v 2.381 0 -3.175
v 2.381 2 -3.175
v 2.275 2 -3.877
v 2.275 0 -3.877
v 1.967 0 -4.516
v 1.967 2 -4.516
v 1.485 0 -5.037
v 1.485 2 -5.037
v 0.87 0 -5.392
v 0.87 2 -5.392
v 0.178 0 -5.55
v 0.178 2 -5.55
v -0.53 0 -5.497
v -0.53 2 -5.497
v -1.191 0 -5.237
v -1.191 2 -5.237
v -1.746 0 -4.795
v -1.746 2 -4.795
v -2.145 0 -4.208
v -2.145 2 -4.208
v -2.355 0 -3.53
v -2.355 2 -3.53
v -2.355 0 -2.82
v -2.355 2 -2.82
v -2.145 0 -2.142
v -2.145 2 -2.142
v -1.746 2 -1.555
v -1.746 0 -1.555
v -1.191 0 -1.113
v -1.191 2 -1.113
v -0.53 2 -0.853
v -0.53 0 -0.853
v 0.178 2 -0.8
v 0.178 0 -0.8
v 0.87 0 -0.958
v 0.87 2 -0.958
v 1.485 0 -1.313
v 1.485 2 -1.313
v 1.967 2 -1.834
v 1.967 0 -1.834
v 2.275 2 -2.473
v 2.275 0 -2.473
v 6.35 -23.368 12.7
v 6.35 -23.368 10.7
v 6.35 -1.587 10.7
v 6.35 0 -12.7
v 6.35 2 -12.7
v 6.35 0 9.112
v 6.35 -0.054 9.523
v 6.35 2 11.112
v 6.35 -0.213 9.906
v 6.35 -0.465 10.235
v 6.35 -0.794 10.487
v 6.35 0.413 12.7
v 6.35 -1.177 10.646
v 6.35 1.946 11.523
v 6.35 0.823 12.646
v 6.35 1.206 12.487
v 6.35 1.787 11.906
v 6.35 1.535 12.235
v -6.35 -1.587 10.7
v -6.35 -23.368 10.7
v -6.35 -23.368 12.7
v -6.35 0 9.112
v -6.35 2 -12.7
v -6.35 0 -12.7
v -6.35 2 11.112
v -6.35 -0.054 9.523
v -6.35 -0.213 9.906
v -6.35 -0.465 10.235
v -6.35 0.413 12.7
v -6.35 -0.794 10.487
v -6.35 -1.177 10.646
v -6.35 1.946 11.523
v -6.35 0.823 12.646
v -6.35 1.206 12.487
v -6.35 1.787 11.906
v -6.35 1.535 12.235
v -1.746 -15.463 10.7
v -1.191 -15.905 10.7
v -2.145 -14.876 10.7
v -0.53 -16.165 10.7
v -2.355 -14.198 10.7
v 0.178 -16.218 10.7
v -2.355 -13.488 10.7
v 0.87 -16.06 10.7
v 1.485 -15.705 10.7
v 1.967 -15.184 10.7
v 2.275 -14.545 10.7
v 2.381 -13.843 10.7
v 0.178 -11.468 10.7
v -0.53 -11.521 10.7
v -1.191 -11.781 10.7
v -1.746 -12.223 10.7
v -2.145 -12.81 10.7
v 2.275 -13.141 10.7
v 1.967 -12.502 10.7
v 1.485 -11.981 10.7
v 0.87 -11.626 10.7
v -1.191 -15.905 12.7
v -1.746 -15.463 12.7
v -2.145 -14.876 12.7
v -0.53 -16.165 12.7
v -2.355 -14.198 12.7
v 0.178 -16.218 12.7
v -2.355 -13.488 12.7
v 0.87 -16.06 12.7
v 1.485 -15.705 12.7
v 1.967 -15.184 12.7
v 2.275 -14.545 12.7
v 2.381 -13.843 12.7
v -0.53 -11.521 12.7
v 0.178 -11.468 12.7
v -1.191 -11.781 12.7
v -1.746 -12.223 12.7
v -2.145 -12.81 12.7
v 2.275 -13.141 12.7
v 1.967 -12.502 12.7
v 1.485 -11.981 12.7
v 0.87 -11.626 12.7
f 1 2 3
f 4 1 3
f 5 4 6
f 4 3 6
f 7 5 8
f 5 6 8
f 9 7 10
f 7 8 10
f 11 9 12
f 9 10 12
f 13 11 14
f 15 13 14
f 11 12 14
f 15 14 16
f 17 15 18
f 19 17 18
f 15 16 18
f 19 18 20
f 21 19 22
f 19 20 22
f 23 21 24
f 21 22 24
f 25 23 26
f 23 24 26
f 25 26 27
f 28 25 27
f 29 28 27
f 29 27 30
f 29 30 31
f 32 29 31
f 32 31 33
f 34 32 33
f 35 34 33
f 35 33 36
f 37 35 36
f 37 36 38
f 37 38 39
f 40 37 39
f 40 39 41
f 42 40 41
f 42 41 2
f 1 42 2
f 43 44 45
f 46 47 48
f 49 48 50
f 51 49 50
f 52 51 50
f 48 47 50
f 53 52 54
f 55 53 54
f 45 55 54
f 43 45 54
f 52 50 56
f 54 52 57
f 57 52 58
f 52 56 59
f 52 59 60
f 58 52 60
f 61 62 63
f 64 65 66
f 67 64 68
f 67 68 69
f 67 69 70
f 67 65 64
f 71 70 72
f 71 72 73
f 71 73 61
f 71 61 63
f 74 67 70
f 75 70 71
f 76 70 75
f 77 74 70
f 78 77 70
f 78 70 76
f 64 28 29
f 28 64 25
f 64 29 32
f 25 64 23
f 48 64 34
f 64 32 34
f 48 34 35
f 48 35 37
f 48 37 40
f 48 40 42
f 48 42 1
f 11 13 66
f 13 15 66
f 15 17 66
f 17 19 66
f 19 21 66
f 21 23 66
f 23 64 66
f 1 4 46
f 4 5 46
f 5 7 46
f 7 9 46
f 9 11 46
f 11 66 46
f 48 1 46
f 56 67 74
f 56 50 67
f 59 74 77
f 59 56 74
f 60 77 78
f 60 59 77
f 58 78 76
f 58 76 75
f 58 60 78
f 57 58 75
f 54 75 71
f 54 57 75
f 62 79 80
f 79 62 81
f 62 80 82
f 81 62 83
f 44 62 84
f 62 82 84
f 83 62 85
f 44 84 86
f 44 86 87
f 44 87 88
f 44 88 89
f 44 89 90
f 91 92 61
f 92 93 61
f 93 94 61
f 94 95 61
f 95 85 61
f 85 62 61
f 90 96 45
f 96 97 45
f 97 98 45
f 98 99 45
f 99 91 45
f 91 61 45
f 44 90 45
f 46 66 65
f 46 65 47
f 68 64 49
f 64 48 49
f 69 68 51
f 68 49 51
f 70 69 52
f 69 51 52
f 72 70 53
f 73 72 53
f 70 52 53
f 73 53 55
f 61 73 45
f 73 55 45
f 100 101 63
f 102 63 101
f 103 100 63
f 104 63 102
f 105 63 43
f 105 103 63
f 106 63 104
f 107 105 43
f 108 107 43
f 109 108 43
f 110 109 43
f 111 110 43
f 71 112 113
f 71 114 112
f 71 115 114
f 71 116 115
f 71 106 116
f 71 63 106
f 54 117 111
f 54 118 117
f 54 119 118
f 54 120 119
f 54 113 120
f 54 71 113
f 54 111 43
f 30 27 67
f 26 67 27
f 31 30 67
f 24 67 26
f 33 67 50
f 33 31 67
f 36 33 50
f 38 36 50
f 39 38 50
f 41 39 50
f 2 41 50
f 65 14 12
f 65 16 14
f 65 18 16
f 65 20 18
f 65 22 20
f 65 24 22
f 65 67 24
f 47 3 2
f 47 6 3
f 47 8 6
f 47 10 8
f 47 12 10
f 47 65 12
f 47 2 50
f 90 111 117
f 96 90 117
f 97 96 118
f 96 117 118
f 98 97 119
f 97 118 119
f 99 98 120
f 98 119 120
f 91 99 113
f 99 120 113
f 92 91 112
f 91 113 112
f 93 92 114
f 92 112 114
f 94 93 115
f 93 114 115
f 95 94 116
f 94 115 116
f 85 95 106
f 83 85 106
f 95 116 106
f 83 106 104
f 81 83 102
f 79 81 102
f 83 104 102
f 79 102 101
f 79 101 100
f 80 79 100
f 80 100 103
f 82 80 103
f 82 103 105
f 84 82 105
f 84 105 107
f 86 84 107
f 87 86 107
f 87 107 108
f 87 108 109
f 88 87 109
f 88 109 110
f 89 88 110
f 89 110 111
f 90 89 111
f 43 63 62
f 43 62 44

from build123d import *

# Parameters (mm, degrees)
CROQUIS1_W              = 12.7
CROQUIS1_H              = 25.4
SALIENTE_EXTRUIR1_DEPTH = 2
CROQUIS2_W              = 12.7
CROQUIS2_H              = 2
SALIENTE_EXTRUIR2_DEPTH = 23.368
REDONDEO1_R             = 1.5875
CROQUIS3_R              = 2.38125
CORTAR_EXTRUIR1_DEPTH   = 26.368
CROQUIS4_R              = 2.38125
CORTAR_EXTRUIR2_DEPTH   = 2.54


with BuildPart() as part:
    # Croquis1 → Saliente-Extruir1 (new body)
    with BuildSketch(Plane(origin=(0, 0, 0), x_dir=(1, 0, 0), z_dir=(0, 1, 0))):
        Rectangle(CROQUIS1_W, CROQUIS1_H)
    extrude(amount=SALIENTE_EXTRUIR1_DEPTH)

    # Croquis2 → Saliente-Extruir2 (add)
    with BuildSketch(Plane.XZ):
        with Locations((0, 11.7)):
            Rectangle(CROQUIS2_W, CROQUIS2_H)
    extrude(amount=SALIENTE_EXTRUIR2_DEPTH)

    # Redondeo1
    redondeo1_edges = [part.edges().sort_by_distance(p)[0] for p in [
        (0, 2, 12.7),
        (0, 0, 10.7),
    ]]
    fillet(redondeo1_edges, radius=REDONDEO1_R)

    # Croquis3 → Cortar-Extruir1 (cut, through all)
    with BuildSketch(Plane(origin=(0, 2, 0), x_dir=(1, 0, 0), z_dir=(0, 1, 0))):
        with Locations((0, 3.175)):
            Circle(CROQUIS3_R)
    extrude(amount=-CORTAR_EXTRUIR1_DEPTH, mode=Mode.SUBTRACT)

    # Croquis4 → Cortar-Extruir2 (cut)
    with BuildSketch(Plane.XY.offset(12.7)):
        with Locations((0, -13.843)):
            Circle(CROQUIS4_R)
    extrude(amount=-CORTAR_EXTRUIR2_DEPTH, mode=Mode.SUBTRACT)


solid = part.part
